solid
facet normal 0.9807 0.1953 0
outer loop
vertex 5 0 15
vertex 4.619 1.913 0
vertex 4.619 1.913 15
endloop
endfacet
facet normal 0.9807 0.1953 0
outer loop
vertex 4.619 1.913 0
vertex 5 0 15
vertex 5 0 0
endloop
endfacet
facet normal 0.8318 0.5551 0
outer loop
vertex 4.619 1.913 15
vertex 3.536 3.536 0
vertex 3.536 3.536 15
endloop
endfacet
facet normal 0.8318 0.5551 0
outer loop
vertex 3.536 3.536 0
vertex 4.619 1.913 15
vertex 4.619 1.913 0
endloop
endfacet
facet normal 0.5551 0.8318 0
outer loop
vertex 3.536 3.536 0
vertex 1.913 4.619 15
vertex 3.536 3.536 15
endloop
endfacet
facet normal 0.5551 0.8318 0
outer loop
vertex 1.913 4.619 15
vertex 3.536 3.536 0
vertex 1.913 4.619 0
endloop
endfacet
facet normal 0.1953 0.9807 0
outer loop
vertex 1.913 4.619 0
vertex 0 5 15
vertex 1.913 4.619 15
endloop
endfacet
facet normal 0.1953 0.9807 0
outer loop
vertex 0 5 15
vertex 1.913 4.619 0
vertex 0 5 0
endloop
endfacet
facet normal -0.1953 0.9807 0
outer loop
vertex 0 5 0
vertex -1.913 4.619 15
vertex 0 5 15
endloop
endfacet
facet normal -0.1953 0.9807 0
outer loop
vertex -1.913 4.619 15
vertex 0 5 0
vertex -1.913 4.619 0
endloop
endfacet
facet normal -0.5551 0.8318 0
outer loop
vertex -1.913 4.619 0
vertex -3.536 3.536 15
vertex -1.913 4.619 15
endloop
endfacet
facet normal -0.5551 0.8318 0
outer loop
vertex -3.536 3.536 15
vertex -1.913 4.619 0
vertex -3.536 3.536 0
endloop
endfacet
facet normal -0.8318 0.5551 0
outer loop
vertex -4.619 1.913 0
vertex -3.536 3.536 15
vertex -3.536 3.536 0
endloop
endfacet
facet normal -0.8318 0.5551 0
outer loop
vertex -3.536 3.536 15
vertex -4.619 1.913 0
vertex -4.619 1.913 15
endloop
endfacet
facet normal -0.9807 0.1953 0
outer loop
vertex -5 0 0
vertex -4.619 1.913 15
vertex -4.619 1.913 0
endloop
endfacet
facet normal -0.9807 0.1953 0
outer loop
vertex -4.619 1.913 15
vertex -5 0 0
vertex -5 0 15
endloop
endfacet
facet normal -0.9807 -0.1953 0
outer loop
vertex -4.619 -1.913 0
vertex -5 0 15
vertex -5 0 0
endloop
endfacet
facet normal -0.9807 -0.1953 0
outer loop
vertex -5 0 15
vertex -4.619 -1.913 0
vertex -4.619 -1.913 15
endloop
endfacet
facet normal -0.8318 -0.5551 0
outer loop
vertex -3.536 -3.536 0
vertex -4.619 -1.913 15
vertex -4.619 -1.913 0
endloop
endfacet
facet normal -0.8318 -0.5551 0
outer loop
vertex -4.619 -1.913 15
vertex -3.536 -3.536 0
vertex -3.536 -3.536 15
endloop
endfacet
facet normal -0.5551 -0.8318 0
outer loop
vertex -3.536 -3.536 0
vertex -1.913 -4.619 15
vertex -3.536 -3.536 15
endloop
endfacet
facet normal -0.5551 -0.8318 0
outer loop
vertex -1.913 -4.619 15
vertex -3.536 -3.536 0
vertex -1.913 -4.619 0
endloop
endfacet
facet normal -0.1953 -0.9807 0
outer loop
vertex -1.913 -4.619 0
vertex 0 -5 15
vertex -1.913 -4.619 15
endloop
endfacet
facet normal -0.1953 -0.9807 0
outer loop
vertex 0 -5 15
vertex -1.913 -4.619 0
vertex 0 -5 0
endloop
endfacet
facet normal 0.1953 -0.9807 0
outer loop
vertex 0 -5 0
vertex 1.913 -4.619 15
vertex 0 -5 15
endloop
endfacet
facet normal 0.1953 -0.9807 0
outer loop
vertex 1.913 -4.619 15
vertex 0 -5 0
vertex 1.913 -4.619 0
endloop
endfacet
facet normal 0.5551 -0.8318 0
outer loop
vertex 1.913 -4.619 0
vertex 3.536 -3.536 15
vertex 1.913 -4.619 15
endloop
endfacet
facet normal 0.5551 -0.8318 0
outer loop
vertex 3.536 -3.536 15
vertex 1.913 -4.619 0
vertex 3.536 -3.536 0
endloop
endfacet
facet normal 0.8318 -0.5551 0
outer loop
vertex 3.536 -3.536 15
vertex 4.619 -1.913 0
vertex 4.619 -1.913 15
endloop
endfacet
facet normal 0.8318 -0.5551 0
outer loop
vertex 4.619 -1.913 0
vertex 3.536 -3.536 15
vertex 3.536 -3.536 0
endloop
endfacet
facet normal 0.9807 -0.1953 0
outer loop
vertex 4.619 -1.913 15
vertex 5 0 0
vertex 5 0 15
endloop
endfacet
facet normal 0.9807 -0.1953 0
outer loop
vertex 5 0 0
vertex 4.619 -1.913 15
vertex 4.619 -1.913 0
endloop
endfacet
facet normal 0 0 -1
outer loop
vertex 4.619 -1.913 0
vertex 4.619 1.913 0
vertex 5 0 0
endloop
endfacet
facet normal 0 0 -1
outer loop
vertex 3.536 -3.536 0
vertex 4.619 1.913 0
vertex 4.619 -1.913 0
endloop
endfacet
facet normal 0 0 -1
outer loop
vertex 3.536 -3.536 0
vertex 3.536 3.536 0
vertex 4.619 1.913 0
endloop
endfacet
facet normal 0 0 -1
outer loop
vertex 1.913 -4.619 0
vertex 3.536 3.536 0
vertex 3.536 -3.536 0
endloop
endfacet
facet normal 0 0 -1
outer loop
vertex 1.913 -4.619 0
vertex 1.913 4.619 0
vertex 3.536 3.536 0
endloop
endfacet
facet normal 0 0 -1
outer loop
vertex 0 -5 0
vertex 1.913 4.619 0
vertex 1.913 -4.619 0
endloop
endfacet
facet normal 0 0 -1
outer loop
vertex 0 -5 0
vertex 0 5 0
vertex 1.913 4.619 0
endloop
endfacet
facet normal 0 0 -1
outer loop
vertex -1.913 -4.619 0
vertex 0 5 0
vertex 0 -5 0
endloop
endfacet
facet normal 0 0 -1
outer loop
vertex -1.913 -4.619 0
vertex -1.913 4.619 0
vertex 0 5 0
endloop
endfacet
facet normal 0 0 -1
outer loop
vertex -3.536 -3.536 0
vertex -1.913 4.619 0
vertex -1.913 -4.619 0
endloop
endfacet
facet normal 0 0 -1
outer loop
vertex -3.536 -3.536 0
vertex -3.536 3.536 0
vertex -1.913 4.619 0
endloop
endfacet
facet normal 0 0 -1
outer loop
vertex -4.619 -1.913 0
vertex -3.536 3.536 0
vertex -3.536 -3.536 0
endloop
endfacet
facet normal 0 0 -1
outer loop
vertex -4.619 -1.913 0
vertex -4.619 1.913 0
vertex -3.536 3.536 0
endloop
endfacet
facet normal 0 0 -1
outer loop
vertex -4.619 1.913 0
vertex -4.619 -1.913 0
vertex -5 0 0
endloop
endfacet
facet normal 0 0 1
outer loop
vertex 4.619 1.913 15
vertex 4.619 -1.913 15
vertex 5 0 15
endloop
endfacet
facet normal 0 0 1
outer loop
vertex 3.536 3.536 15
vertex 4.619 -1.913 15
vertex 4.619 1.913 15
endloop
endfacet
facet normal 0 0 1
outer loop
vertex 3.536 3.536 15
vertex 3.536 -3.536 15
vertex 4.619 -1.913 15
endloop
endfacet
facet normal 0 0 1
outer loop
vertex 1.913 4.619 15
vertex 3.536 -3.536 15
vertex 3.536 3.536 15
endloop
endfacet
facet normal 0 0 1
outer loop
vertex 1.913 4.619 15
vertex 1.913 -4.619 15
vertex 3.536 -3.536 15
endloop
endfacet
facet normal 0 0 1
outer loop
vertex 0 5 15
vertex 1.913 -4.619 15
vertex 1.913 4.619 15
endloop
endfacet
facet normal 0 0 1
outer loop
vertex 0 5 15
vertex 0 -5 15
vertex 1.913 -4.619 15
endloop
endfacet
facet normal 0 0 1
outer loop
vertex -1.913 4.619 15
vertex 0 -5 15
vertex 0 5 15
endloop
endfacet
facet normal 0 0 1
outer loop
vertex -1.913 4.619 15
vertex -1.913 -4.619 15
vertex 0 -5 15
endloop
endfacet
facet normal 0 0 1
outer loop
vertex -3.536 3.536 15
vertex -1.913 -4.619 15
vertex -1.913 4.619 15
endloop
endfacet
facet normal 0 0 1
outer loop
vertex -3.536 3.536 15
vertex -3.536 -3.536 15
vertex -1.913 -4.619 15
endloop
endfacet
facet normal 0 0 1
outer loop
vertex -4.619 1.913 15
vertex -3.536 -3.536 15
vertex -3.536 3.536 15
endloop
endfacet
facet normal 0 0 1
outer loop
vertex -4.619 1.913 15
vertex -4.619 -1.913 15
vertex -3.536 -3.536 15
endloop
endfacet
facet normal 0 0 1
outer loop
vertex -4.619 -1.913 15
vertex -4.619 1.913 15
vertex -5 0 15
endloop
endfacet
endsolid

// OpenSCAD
// Ein Zylinder mit einstellbaren Parametern
module customCylinder(h, r) {
    // h: Höhe des Zylinders
    // r: Radius des Zylinders
    cylinder(h = h, r = r);
}

customCylinder(15, 5); // Aufruf der Funktion mit Höhe 15 und Radius 5
